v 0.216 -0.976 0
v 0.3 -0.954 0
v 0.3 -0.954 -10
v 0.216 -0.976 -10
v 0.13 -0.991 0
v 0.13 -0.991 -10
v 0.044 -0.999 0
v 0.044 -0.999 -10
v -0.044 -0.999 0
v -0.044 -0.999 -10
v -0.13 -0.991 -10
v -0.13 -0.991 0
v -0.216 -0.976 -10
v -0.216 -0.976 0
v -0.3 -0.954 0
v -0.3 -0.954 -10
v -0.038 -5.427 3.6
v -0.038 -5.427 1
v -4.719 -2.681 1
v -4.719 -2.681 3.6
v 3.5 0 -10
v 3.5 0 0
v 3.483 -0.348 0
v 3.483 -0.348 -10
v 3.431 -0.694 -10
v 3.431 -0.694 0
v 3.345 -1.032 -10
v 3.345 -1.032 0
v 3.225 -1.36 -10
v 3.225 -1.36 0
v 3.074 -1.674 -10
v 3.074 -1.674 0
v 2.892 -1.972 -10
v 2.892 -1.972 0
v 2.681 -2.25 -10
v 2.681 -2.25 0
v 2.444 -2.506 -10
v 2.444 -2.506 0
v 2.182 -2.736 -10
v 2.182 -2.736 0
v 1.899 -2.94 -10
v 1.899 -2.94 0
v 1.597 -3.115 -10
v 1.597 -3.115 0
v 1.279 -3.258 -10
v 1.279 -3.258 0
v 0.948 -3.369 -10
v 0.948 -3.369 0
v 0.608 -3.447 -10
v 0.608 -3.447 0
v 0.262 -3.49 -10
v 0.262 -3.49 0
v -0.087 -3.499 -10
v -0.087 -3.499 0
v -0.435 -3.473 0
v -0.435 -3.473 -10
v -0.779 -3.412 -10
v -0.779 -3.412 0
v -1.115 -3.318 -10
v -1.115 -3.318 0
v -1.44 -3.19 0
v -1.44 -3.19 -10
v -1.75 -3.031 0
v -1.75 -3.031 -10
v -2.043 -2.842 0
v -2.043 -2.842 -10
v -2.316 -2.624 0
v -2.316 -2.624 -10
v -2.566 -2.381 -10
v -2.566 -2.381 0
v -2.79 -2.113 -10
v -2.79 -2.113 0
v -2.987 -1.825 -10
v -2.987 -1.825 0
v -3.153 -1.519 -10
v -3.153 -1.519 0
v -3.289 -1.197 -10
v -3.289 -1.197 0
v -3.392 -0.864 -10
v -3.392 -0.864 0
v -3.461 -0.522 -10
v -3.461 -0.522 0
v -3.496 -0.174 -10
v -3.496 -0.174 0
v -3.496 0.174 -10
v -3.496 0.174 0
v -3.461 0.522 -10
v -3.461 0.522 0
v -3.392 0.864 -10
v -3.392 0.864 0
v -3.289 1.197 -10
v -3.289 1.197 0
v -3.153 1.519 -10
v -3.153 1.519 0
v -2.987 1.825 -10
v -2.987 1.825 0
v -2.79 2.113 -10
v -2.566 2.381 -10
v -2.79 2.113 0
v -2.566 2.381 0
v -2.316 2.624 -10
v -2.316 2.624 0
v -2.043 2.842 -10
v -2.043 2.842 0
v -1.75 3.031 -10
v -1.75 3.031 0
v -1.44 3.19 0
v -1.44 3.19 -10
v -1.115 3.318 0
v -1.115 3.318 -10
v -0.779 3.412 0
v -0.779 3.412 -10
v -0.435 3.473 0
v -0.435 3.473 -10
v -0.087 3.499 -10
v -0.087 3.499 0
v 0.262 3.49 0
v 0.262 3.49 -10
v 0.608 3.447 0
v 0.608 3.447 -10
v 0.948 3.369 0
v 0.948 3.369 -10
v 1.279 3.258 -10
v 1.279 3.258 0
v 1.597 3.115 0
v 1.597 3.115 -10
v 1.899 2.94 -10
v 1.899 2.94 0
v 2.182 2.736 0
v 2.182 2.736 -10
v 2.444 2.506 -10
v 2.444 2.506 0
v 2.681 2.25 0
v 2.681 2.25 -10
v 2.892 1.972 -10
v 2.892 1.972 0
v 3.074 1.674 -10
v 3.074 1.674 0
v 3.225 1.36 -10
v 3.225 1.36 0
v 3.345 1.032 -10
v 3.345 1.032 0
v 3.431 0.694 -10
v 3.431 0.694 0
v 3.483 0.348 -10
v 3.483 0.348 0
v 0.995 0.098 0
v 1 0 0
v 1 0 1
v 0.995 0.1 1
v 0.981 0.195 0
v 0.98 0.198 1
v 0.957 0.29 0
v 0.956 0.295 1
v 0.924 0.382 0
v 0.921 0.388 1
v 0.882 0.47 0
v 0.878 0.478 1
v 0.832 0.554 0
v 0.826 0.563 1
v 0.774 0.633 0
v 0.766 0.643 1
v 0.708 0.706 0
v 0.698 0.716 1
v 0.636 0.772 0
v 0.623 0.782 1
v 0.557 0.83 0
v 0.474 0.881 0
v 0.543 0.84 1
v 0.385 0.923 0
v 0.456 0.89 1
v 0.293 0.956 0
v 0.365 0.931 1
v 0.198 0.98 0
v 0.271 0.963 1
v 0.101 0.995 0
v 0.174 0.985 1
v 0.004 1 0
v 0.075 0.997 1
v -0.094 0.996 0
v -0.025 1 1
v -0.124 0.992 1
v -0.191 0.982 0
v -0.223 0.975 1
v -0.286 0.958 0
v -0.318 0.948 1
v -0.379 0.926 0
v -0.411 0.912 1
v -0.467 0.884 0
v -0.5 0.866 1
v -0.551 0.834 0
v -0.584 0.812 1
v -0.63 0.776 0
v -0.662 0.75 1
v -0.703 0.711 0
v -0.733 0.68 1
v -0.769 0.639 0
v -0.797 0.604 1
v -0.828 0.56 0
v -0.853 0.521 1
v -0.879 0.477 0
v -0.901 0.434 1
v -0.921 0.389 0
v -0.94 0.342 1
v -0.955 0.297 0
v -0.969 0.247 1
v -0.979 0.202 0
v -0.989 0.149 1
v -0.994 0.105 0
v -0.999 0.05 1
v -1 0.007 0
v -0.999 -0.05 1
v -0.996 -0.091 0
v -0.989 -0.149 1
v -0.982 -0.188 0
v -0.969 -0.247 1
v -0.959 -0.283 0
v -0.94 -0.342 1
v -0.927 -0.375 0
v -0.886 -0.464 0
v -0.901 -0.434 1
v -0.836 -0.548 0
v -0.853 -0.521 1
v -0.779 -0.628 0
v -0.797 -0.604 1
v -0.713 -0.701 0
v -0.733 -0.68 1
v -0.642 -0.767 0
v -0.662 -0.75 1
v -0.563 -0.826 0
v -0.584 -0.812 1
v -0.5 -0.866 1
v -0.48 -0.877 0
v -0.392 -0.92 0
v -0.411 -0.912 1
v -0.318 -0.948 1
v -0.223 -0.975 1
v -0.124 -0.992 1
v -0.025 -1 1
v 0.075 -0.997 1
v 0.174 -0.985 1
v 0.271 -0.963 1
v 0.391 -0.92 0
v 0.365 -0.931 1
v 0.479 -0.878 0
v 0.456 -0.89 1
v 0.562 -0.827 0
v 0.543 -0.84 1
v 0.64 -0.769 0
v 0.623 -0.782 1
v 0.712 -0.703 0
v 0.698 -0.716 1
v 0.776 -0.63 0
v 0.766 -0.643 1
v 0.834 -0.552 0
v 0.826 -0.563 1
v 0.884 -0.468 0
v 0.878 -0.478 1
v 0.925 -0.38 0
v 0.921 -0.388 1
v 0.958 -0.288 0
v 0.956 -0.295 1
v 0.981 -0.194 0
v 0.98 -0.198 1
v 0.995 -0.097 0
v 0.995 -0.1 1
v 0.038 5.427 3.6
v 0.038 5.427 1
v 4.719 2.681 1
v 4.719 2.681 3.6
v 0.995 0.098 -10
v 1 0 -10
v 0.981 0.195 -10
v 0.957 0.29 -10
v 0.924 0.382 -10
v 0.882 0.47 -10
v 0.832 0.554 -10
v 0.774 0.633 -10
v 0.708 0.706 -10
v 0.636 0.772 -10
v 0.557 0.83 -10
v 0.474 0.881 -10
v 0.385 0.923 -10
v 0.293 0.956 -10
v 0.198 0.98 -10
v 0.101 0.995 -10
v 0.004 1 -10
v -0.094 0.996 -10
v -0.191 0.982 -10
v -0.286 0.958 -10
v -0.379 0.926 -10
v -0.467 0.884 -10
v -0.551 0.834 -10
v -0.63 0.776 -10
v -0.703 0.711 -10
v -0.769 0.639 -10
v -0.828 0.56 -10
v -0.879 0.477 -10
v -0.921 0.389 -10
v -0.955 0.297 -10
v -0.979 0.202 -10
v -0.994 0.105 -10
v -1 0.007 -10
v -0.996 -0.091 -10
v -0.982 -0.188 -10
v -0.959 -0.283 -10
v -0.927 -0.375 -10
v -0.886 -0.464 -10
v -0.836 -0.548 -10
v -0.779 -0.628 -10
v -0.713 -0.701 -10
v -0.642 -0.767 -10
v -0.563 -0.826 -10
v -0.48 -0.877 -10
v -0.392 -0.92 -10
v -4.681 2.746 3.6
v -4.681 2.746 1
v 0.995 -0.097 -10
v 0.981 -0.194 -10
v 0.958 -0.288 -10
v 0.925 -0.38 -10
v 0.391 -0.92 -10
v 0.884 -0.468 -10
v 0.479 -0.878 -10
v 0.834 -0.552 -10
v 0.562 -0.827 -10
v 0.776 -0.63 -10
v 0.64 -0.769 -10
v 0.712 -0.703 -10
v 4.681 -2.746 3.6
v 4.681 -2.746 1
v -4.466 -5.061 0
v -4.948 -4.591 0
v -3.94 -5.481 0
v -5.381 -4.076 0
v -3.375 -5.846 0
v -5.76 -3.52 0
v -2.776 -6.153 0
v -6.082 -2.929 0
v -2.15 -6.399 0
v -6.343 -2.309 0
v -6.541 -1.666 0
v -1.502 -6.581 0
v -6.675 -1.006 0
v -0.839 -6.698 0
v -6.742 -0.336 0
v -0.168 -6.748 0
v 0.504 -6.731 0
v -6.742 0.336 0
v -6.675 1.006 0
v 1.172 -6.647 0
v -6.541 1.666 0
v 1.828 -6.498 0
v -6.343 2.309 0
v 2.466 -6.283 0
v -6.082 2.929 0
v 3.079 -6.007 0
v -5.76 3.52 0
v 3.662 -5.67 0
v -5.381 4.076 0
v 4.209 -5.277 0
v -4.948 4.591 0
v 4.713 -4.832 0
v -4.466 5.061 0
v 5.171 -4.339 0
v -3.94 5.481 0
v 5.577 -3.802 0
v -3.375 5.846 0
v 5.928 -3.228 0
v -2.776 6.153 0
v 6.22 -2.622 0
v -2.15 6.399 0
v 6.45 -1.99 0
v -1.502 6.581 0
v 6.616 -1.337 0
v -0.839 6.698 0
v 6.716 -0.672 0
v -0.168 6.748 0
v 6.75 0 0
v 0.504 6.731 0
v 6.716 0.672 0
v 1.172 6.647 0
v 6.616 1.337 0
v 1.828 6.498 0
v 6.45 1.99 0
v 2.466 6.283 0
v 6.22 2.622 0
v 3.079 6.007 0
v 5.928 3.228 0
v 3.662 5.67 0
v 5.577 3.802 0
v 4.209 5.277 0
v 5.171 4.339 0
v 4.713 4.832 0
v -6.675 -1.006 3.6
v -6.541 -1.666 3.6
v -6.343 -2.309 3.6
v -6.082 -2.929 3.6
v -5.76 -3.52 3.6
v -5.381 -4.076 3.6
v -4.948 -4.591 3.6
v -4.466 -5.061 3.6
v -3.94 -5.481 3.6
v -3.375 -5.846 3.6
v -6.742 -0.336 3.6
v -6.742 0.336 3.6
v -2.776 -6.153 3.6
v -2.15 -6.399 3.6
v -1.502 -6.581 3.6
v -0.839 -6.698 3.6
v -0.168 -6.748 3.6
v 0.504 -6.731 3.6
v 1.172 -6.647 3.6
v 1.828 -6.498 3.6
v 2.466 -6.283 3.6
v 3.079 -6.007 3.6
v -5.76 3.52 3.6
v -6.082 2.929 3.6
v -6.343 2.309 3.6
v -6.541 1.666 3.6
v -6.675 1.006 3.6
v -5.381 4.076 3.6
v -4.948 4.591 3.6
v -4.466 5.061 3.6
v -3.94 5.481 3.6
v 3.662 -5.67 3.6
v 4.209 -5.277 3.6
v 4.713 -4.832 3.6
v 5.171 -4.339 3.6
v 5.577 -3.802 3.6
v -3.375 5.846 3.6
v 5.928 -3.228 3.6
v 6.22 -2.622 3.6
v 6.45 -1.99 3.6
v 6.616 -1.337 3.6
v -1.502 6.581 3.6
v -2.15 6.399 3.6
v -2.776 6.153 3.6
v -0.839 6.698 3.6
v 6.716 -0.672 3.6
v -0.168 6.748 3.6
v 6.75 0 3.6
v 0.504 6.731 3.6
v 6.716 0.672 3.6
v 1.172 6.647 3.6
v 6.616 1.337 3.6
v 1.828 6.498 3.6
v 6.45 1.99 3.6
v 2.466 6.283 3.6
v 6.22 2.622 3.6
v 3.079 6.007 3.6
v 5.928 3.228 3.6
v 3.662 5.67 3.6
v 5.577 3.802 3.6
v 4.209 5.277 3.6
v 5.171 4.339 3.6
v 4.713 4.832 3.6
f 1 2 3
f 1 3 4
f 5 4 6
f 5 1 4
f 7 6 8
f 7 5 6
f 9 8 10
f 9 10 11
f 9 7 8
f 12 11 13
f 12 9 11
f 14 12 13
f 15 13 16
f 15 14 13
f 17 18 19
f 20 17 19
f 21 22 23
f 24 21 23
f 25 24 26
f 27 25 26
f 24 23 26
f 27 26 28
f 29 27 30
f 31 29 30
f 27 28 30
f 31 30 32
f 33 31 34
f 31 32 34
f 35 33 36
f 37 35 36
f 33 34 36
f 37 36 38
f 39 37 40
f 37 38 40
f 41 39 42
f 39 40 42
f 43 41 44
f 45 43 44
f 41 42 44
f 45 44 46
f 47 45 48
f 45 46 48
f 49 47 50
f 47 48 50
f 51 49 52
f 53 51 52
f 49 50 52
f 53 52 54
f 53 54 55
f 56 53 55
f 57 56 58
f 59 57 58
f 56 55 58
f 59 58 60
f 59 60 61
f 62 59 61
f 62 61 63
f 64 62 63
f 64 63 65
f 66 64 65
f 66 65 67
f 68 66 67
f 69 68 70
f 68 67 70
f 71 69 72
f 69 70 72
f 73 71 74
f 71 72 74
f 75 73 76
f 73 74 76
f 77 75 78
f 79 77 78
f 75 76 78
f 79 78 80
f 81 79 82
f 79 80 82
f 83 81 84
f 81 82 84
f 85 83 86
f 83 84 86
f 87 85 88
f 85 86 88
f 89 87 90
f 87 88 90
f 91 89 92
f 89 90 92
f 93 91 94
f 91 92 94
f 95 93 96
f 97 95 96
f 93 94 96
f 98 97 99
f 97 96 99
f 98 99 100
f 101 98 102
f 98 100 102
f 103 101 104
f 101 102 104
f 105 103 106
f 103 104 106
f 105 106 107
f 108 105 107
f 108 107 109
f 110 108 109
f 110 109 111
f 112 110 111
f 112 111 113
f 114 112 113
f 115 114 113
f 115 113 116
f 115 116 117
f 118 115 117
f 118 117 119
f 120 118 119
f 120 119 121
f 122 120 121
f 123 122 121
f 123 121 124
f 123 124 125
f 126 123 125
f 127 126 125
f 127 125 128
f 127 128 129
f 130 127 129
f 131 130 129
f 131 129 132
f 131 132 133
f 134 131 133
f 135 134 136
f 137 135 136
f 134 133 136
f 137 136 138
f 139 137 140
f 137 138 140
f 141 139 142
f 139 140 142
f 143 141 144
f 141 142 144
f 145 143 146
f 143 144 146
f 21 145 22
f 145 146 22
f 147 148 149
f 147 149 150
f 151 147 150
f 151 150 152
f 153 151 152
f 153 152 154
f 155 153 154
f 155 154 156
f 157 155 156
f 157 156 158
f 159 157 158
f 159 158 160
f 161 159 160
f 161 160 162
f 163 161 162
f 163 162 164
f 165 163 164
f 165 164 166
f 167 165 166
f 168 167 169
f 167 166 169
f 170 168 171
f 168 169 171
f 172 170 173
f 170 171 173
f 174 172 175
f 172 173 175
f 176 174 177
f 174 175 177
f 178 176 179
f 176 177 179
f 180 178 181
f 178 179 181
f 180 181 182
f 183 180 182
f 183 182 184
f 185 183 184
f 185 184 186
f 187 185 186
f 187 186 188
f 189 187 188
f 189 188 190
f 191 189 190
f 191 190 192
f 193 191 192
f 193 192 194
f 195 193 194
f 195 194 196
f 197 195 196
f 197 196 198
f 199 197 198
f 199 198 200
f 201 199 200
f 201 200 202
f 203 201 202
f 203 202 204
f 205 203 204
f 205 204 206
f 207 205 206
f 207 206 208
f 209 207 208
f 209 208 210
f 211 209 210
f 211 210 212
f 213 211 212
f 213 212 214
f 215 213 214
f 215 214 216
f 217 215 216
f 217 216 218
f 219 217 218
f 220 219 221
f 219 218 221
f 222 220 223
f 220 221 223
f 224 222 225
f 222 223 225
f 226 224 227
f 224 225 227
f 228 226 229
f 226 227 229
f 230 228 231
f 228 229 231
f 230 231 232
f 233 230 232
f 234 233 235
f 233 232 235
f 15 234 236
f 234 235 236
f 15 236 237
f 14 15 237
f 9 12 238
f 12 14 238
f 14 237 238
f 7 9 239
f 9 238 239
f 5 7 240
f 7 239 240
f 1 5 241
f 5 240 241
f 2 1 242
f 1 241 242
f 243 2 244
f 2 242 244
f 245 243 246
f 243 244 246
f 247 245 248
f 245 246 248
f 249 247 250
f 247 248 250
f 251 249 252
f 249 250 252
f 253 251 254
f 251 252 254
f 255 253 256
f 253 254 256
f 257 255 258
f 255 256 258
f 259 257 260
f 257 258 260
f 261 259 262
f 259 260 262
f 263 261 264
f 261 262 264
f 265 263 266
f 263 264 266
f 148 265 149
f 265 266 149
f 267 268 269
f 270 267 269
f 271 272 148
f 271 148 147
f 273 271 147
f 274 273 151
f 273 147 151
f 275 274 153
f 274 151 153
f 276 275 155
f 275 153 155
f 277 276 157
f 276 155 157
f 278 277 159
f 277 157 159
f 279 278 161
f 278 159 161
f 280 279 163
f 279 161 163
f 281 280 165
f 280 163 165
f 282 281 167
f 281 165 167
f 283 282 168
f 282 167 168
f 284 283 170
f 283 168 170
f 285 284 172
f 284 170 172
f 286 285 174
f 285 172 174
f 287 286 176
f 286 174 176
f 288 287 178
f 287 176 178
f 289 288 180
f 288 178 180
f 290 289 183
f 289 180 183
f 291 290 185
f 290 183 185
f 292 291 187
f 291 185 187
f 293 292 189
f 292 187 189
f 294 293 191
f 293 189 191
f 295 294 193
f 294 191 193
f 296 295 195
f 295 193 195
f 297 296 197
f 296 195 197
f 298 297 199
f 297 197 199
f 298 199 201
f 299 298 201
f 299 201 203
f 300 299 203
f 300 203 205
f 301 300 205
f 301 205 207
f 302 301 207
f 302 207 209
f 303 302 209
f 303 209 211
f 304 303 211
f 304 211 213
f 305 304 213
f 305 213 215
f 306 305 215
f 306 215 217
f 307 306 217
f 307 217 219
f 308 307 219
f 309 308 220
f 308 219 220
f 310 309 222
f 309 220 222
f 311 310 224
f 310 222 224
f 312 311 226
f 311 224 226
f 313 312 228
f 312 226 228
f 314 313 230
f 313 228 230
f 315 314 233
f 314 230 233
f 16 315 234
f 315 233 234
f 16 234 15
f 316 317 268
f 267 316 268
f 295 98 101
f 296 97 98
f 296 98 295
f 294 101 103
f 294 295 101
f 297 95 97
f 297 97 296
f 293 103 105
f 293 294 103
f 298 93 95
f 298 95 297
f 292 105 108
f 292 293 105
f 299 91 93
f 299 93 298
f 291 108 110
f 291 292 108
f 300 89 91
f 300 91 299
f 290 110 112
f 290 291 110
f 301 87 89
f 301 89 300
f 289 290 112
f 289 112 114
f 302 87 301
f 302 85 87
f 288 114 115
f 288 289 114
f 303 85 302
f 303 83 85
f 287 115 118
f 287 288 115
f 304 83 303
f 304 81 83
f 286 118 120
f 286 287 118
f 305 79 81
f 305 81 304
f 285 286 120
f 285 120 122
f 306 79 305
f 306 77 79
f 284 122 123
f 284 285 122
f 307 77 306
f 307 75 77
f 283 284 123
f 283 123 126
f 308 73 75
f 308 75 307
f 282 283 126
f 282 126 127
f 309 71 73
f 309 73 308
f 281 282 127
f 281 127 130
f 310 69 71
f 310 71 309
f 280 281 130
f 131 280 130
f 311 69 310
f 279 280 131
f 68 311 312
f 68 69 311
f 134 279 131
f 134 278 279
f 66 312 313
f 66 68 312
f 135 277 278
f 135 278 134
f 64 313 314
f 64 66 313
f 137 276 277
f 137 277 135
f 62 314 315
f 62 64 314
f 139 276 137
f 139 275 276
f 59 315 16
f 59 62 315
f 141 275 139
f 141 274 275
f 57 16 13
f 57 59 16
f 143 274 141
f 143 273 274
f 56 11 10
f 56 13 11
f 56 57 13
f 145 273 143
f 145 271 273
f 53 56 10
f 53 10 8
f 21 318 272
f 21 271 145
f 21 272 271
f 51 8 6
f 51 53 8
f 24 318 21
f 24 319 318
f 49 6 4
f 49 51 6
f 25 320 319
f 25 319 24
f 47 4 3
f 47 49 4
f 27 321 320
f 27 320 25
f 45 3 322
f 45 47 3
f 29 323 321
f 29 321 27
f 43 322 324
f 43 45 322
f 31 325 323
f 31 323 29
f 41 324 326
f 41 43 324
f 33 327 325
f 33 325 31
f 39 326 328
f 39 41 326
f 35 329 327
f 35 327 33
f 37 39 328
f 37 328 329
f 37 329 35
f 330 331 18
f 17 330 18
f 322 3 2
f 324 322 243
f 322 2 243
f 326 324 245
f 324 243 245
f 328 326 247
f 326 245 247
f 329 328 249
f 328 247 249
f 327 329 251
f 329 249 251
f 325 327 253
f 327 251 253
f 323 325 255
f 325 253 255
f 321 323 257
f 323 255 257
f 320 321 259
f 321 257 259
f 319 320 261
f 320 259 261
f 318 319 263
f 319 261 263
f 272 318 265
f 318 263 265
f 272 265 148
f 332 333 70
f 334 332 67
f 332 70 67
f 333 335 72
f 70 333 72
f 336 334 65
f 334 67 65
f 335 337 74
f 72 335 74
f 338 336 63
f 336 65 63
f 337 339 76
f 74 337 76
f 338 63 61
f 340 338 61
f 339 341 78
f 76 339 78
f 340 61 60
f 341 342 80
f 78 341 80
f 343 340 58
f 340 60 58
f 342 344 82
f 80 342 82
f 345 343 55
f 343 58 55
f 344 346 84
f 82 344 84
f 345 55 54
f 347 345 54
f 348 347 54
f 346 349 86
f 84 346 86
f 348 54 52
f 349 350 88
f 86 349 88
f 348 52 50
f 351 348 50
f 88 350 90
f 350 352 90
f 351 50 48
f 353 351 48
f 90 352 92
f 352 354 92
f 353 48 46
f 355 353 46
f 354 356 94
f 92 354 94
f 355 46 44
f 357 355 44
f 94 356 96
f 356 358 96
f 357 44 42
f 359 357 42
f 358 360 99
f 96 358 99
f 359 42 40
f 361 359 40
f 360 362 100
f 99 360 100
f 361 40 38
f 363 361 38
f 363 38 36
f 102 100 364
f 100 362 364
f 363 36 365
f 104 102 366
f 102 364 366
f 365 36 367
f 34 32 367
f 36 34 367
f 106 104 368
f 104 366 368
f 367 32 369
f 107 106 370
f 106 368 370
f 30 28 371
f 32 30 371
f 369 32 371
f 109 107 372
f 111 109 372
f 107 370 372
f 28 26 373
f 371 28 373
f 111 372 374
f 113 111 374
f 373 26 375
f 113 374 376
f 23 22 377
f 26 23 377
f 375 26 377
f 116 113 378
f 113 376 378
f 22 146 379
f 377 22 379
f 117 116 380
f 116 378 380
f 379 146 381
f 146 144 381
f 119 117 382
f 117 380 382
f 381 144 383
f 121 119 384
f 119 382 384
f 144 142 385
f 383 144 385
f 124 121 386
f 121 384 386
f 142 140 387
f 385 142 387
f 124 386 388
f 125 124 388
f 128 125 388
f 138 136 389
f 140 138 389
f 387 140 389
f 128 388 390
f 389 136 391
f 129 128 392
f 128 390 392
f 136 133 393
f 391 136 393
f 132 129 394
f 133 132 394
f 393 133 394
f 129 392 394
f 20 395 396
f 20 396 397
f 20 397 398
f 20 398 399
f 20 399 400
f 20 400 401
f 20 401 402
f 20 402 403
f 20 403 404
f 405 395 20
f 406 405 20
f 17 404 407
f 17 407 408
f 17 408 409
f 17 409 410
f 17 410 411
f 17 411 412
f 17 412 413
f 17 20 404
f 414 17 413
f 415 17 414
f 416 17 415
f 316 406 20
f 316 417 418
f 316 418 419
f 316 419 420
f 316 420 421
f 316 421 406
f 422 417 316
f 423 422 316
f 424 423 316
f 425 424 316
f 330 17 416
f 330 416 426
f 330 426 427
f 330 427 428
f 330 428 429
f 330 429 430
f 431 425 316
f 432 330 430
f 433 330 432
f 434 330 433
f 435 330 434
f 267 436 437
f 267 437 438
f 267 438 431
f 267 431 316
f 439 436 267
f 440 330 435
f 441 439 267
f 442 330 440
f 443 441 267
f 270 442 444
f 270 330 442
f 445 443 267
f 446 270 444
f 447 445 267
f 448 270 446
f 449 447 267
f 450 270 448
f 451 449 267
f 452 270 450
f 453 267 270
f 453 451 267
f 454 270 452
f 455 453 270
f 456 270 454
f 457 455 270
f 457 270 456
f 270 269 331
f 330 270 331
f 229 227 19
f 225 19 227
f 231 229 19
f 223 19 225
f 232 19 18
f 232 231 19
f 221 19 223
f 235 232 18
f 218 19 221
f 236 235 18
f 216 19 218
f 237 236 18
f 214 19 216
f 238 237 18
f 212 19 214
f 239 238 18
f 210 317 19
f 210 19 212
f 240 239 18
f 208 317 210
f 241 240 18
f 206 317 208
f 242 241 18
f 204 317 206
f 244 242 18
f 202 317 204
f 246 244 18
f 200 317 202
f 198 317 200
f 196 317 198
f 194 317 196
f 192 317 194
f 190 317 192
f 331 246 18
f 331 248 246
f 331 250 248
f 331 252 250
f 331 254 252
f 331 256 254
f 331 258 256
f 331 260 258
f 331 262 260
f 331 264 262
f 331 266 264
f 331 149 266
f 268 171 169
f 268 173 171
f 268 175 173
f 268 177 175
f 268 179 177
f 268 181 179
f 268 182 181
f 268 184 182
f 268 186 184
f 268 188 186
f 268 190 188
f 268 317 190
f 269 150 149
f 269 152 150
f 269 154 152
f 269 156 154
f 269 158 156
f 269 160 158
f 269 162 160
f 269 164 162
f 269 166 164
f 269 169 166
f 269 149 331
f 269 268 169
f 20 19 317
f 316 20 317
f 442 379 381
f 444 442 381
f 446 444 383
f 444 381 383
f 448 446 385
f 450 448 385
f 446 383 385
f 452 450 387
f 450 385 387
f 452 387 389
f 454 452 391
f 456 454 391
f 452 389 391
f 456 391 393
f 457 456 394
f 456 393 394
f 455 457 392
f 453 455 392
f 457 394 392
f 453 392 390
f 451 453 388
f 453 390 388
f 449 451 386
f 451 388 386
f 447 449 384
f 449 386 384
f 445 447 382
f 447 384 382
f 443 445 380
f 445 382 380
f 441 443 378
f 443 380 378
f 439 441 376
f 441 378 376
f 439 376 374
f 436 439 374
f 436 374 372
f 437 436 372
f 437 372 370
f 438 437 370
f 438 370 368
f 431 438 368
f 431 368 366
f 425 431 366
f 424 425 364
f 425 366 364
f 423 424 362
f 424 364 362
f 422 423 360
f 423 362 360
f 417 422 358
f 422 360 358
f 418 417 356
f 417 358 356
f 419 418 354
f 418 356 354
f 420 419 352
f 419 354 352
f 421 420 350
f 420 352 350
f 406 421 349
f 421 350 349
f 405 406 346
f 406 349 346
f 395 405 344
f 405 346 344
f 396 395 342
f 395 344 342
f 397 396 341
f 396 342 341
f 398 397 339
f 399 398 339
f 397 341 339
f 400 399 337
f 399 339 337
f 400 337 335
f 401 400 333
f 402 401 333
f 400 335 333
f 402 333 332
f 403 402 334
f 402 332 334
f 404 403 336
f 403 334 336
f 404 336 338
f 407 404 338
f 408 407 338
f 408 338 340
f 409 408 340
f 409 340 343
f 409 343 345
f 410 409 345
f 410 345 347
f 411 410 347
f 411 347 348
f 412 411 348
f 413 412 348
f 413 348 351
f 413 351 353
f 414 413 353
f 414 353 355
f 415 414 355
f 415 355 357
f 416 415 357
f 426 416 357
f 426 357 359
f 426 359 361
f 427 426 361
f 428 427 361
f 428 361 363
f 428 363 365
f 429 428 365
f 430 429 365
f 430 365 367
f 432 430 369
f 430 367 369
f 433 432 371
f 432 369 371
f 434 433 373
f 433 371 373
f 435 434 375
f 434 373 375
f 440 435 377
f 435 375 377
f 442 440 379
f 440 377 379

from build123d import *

# Parameters (mm, degrees)
F0_R     = 6.75
F1_DEPTH = 3.6
F2_DEPTH = 1
F3_R     = 1
F4_DEPTH = 25
F6_DEPTH = 10
F8_R     = 3.5
F9_DEPTH = 10


with BuildPart() as f1:
    # F0 (on Top) → F1 (new body)
    with BuildSketch(Plane.XY):
        Circle(F0_R)
        Polygon((-4.6808759634, 2.7464037483), (0.0380174333, 5.4269593704), (4.7188933967, 2.6805556222), (4.6808759634, -2.7464037483), (-0.0380174333, -5.4269593704), (-4.7188933967, -2.6805556222), align=None, mode=Mode.SUBTRACT)
    extrude(amount=F1_DEPTH)

    # F0 (on Top) → F2 (join)
    with BuildSketch(Plane.XY):
        Polygon((4.7188933967, 2.6805556222), (0.0380174333, 5.4269593704), (-4.6808759634, 2.7464037483), (-4.7188933967, -2.6805556222), (-0.0380174333, -5.4269593704), (4.6808759634, -2.7464037483), align=None)
    extrude(amount=F2_DEPTH)

    # F3 (on face) → F4 (cut)
    with BuildSketch(Plane.XY.offset(1)):
        Circle(F3_R)
    extrude(amount=-F4_DEPTH, mode=Mode.SUBTRACT)

    # F5 (on face) → F6 (join)
    with BuildSketch(Plane.XY):
        with BuildLine():
            ThreePointArc((0.3, -0.9539392014), (0, -1), (-0.3, -0.9539392014))
            add(Edge.make_bspline(
                [(-0.3, -0.9539392014), (-0.2571564854, -1.7815360064), (-0.0005705868, -3.4185465418), (0.2582976589, -1.7813709101), (0.3, -0.9539392014)],
                knots=[0, 0, 0, 0, 0.5, 1, 1, 1, 1], degree=3))
        make_face()
    extrude(amount=-F6_DEPTH)

    # F8 (on face) → F9 (join)
    with BuildSketch(Plane(origin=(0, 0, 0), x_dir=(1, 0, 0), z_dir=(0, 0, -1))):
        Circle(F8_R)
        with BuildLine():
            ThreePointArc((0.3, 0.9539392014), (0.8062257748, 0.5916079783), (1, 0))
            ThreePointArc((1, 0), (-0.5916079783, -0.8062257748), (-0.3, 0.9539392014))
            add(Edge.make_bspline(
                [(-0.3, 0.9539392014), (-0.2571564854, 1.7815360064), (-0.0005705868, 3.4185465418), (0.2582976589, 1.7813709101), (0.3, 0.9539392014)],
                knots=[0, 0, 0, 0, 0.5, 1, 1, 1, 1], degree=3))
        make_face(mode=Mode.SUBTRACT)
    extrude(amount=F9_DEPTH)


solid = f1.part
